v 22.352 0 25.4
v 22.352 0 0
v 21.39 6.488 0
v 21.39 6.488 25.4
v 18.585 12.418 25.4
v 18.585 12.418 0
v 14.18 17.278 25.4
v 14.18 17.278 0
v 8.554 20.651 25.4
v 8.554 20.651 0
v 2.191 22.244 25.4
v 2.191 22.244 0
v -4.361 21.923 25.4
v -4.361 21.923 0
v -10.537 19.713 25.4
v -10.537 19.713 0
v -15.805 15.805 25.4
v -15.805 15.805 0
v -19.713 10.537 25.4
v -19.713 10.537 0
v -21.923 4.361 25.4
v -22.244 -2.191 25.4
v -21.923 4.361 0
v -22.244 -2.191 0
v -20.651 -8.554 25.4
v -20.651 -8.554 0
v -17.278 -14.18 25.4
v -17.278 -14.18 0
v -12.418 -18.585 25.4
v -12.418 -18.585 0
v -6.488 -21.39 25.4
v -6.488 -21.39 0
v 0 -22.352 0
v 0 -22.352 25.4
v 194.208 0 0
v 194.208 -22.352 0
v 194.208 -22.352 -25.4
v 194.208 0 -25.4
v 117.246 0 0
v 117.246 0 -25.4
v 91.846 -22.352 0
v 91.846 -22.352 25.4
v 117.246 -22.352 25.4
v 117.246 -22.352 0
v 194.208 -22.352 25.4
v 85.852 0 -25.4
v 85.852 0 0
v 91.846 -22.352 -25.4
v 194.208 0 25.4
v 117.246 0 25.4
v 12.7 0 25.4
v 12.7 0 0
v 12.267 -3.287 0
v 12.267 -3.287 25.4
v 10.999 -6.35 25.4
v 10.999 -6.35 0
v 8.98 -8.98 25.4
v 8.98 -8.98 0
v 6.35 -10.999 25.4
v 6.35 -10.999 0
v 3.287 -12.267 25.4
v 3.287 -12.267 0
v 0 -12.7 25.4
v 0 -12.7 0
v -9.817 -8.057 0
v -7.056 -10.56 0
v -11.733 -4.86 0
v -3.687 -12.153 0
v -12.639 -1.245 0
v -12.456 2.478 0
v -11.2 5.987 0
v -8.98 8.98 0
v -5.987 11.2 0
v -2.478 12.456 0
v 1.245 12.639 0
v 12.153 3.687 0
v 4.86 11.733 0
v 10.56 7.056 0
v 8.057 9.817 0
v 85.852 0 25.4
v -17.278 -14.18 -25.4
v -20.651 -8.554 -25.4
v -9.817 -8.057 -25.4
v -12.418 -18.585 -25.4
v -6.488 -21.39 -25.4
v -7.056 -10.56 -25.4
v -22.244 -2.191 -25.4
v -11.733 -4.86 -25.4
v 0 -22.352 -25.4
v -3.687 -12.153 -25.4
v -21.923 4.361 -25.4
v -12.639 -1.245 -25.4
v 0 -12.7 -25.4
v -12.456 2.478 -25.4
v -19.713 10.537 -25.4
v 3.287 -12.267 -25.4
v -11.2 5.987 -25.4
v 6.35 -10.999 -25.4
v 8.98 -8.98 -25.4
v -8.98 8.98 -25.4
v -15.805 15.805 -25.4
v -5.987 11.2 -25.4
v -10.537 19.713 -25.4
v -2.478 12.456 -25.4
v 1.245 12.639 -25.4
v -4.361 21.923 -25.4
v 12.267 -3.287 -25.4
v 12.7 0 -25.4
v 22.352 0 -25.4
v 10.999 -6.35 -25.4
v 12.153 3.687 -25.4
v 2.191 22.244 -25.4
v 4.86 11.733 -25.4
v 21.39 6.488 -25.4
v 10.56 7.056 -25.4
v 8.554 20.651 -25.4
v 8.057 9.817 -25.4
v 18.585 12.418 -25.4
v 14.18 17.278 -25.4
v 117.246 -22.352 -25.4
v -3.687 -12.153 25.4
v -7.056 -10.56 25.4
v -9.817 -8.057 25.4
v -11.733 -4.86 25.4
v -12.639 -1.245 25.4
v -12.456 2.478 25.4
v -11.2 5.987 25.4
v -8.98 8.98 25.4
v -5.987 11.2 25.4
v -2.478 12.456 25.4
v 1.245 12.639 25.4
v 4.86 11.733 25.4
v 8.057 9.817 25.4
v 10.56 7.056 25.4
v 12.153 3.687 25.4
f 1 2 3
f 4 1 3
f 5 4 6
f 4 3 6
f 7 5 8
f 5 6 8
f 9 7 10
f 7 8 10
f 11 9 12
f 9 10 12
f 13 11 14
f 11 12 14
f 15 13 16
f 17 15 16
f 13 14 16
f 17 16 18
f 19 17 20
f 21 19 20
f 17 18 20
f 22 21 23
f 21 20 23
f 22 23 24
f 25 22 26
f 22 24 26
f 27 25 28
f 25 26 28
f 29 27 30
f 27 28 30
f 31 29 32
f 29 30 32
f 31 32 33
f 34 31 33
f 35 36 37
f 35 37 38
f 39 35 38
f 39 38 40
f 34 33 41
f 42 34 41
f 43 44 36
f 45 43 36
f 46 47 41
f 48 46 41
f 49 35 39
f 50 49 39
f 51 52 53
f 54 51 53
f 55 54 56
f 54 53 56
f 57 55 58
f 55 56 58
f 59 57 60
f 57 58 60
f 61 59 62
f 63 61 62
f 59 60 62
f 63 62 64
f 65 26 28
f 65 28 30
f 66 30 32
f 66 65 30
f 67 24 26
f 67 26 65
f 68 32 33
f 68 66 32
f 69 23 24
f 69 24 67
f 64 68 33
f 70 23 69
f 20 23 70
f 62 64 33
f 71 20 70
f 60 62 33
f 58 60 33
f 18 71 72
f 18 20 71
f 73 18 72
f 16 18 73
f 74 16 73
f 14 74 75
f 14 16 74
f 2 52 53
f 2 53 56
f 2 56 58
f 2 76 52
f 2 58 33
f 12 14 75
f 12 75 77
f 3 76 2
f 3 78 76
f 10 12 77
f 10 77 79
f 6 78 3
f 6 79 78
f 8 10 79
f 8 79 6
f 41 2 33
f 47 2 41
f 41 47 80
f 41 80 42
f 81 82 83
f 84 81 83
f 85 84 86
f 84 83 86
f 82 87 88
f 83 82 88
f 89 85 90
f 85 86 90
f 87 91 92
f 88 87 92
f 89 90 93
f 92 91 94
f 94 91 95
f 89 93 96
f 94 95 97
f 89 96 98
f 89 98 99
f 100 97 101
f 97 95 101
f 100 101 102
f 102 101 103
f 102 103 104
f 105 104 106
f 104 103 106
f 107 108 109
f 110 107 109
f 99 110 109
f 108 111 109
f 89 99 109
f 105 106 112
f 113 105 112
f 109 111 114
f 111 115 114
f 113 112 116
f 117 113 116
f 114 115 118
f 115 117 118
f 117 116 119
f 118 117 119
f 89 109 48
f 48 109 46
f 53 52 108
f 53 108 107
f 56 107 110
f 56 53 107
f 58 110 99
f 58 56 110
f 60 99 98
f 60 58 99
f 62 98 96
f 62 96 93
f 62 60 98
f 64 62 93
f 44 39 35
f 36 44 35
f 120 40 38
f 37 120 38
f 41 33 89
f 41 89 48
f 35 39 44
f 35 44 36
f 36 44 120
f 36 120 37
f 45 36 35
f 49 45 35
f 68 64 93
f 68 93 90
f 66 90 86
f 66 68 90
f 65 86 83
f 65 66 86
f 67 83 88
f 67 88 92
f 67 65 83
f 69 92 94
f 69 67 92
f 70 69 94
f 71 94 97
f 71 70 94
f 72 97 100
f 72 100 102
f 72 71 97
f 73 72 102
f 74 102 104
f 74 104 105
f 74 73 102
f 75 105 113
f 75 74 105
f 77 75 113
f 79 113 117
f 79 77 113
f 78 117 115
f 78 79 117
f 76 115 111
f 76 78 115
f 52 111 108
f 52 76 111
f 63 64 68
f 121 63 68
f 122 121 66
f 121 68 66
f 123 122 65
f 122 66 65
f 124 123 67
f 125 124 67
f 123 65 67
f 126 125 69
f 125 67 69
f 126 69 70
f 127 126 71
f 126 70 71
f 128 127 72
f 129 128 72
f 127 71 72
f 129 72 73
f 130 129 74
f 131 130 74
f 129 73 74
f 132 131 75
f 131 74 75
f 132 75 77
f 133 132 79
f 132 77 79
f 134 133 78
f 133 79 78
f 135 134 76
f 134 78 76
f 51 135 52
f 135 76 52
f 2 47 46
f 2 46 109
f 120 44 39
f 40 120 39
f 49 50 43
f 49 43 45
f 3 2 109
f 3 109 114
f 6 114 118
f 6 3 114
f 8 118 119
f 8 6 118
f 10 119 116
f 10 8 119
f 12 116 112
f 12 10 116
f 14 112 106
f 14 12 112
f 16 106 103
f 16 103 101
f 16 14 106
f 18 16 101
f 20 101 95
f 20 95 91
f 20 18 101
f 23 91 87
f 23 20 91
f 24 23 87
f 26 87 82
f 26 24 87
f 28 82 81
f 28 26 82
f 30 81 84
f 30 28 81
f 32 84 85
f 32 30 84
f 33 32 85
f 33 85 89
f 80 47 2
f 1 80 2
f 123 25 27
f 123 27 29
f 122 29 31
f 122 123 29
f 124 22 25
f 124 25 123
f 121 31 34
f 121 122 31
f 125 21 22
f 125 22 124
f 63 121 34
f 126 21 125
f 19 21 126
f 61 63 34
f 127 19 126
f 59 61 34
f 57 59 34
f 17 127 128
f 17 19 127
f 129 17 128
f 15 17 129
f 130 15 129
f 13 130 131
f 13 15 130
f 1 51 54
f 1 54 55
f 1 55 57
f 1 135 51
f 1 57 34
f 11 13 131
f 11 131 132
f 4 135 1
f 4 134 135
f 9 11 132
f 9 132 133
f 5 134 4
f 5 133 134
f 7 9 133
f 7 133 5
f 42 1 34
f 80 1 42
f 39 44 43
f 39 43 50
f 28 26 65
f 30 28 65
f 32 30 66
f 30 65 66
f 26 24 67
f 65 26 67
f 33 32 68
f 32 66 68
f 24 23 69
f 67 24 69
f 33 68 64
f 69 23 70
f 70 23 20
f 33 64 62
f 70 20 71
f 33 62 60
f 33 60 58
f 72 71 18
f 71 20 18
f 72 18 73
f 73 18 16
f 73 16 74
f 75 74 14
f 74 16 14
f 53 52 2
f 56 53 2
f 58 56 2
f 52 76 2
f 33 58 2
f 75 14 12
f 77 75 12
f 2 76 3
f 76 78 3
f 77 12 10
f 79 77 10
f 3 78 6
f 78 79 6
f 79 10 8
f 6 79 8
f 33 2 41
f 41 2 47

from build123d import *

# Parameters (mm, degrees)
F0_W     = 76.962
F0_H     = 22.352
F1_DEPTH = 25.4
F2_DEPTH = 25.4


with BuildPart() as f1:
    # F0 (on Top) → F1 (new body)
    with BuildSketch(Plane.XY):
        with BuildLine():
            Line((22.352, 0), (12.7, 0))
            ThreePointArc((12.7, 0), (8.9802561211, -8.9802561211), (0, -12.7))
            Line((0, -12.7), (0, -22.352))
            ThreePointArc((0, -22.352), (15.8052507731, -15.8052507731), (22.352, 0))
        make_face()
        with BuildLine():
            ThreePointArc((0, -12.7), (-8.9802561211, 8.9802561211), (12.7, 0))
            Line((12.7, 0), (22.352, 0))
            ThreePointArc((22.352, 0), (-15.8052507731, 15.8052507731), (0, -22.352))
            Line((0, -22.352), (0, -12.7))
        make_face()
        with BuildLine():
            Line((85.852, 0), (22.352, 0))
            ThreePointArc((22.352, 0), (15.8052507731, -15.8052507731), (0, -22.352))
            Line((0, -22.352), (91.8464, -22.352))
            Line((91.8464, -22.352), (85.852, 0))
        make_face()
        Polygon((117.2464, 0), (85.852, 0), (91.8464, -22.352), (117.2464, -22.352), align=None)
        with Locations((155.7274, -11.176)):
            Rectangle(F0_W, F0_H)
    extrude(amount=F1_DEPTH)

    # F0 (on Top) → F2 (cut)
    with BuildSketch(Plane.XY):
        Polygon((117.2464, 0), (85.852, 0), (91.8464, -22.352), (117.2464, -22.352), align=None)
    extrude(amount=F2_DEPTH, mode=Mode.SUBTRACT)


with BuildPart() as f3_1:
    # F3: instance of F1
    add(f1.part.mirror(Plane.XY))


solid = Compound([f1.part, f3_1.part])
